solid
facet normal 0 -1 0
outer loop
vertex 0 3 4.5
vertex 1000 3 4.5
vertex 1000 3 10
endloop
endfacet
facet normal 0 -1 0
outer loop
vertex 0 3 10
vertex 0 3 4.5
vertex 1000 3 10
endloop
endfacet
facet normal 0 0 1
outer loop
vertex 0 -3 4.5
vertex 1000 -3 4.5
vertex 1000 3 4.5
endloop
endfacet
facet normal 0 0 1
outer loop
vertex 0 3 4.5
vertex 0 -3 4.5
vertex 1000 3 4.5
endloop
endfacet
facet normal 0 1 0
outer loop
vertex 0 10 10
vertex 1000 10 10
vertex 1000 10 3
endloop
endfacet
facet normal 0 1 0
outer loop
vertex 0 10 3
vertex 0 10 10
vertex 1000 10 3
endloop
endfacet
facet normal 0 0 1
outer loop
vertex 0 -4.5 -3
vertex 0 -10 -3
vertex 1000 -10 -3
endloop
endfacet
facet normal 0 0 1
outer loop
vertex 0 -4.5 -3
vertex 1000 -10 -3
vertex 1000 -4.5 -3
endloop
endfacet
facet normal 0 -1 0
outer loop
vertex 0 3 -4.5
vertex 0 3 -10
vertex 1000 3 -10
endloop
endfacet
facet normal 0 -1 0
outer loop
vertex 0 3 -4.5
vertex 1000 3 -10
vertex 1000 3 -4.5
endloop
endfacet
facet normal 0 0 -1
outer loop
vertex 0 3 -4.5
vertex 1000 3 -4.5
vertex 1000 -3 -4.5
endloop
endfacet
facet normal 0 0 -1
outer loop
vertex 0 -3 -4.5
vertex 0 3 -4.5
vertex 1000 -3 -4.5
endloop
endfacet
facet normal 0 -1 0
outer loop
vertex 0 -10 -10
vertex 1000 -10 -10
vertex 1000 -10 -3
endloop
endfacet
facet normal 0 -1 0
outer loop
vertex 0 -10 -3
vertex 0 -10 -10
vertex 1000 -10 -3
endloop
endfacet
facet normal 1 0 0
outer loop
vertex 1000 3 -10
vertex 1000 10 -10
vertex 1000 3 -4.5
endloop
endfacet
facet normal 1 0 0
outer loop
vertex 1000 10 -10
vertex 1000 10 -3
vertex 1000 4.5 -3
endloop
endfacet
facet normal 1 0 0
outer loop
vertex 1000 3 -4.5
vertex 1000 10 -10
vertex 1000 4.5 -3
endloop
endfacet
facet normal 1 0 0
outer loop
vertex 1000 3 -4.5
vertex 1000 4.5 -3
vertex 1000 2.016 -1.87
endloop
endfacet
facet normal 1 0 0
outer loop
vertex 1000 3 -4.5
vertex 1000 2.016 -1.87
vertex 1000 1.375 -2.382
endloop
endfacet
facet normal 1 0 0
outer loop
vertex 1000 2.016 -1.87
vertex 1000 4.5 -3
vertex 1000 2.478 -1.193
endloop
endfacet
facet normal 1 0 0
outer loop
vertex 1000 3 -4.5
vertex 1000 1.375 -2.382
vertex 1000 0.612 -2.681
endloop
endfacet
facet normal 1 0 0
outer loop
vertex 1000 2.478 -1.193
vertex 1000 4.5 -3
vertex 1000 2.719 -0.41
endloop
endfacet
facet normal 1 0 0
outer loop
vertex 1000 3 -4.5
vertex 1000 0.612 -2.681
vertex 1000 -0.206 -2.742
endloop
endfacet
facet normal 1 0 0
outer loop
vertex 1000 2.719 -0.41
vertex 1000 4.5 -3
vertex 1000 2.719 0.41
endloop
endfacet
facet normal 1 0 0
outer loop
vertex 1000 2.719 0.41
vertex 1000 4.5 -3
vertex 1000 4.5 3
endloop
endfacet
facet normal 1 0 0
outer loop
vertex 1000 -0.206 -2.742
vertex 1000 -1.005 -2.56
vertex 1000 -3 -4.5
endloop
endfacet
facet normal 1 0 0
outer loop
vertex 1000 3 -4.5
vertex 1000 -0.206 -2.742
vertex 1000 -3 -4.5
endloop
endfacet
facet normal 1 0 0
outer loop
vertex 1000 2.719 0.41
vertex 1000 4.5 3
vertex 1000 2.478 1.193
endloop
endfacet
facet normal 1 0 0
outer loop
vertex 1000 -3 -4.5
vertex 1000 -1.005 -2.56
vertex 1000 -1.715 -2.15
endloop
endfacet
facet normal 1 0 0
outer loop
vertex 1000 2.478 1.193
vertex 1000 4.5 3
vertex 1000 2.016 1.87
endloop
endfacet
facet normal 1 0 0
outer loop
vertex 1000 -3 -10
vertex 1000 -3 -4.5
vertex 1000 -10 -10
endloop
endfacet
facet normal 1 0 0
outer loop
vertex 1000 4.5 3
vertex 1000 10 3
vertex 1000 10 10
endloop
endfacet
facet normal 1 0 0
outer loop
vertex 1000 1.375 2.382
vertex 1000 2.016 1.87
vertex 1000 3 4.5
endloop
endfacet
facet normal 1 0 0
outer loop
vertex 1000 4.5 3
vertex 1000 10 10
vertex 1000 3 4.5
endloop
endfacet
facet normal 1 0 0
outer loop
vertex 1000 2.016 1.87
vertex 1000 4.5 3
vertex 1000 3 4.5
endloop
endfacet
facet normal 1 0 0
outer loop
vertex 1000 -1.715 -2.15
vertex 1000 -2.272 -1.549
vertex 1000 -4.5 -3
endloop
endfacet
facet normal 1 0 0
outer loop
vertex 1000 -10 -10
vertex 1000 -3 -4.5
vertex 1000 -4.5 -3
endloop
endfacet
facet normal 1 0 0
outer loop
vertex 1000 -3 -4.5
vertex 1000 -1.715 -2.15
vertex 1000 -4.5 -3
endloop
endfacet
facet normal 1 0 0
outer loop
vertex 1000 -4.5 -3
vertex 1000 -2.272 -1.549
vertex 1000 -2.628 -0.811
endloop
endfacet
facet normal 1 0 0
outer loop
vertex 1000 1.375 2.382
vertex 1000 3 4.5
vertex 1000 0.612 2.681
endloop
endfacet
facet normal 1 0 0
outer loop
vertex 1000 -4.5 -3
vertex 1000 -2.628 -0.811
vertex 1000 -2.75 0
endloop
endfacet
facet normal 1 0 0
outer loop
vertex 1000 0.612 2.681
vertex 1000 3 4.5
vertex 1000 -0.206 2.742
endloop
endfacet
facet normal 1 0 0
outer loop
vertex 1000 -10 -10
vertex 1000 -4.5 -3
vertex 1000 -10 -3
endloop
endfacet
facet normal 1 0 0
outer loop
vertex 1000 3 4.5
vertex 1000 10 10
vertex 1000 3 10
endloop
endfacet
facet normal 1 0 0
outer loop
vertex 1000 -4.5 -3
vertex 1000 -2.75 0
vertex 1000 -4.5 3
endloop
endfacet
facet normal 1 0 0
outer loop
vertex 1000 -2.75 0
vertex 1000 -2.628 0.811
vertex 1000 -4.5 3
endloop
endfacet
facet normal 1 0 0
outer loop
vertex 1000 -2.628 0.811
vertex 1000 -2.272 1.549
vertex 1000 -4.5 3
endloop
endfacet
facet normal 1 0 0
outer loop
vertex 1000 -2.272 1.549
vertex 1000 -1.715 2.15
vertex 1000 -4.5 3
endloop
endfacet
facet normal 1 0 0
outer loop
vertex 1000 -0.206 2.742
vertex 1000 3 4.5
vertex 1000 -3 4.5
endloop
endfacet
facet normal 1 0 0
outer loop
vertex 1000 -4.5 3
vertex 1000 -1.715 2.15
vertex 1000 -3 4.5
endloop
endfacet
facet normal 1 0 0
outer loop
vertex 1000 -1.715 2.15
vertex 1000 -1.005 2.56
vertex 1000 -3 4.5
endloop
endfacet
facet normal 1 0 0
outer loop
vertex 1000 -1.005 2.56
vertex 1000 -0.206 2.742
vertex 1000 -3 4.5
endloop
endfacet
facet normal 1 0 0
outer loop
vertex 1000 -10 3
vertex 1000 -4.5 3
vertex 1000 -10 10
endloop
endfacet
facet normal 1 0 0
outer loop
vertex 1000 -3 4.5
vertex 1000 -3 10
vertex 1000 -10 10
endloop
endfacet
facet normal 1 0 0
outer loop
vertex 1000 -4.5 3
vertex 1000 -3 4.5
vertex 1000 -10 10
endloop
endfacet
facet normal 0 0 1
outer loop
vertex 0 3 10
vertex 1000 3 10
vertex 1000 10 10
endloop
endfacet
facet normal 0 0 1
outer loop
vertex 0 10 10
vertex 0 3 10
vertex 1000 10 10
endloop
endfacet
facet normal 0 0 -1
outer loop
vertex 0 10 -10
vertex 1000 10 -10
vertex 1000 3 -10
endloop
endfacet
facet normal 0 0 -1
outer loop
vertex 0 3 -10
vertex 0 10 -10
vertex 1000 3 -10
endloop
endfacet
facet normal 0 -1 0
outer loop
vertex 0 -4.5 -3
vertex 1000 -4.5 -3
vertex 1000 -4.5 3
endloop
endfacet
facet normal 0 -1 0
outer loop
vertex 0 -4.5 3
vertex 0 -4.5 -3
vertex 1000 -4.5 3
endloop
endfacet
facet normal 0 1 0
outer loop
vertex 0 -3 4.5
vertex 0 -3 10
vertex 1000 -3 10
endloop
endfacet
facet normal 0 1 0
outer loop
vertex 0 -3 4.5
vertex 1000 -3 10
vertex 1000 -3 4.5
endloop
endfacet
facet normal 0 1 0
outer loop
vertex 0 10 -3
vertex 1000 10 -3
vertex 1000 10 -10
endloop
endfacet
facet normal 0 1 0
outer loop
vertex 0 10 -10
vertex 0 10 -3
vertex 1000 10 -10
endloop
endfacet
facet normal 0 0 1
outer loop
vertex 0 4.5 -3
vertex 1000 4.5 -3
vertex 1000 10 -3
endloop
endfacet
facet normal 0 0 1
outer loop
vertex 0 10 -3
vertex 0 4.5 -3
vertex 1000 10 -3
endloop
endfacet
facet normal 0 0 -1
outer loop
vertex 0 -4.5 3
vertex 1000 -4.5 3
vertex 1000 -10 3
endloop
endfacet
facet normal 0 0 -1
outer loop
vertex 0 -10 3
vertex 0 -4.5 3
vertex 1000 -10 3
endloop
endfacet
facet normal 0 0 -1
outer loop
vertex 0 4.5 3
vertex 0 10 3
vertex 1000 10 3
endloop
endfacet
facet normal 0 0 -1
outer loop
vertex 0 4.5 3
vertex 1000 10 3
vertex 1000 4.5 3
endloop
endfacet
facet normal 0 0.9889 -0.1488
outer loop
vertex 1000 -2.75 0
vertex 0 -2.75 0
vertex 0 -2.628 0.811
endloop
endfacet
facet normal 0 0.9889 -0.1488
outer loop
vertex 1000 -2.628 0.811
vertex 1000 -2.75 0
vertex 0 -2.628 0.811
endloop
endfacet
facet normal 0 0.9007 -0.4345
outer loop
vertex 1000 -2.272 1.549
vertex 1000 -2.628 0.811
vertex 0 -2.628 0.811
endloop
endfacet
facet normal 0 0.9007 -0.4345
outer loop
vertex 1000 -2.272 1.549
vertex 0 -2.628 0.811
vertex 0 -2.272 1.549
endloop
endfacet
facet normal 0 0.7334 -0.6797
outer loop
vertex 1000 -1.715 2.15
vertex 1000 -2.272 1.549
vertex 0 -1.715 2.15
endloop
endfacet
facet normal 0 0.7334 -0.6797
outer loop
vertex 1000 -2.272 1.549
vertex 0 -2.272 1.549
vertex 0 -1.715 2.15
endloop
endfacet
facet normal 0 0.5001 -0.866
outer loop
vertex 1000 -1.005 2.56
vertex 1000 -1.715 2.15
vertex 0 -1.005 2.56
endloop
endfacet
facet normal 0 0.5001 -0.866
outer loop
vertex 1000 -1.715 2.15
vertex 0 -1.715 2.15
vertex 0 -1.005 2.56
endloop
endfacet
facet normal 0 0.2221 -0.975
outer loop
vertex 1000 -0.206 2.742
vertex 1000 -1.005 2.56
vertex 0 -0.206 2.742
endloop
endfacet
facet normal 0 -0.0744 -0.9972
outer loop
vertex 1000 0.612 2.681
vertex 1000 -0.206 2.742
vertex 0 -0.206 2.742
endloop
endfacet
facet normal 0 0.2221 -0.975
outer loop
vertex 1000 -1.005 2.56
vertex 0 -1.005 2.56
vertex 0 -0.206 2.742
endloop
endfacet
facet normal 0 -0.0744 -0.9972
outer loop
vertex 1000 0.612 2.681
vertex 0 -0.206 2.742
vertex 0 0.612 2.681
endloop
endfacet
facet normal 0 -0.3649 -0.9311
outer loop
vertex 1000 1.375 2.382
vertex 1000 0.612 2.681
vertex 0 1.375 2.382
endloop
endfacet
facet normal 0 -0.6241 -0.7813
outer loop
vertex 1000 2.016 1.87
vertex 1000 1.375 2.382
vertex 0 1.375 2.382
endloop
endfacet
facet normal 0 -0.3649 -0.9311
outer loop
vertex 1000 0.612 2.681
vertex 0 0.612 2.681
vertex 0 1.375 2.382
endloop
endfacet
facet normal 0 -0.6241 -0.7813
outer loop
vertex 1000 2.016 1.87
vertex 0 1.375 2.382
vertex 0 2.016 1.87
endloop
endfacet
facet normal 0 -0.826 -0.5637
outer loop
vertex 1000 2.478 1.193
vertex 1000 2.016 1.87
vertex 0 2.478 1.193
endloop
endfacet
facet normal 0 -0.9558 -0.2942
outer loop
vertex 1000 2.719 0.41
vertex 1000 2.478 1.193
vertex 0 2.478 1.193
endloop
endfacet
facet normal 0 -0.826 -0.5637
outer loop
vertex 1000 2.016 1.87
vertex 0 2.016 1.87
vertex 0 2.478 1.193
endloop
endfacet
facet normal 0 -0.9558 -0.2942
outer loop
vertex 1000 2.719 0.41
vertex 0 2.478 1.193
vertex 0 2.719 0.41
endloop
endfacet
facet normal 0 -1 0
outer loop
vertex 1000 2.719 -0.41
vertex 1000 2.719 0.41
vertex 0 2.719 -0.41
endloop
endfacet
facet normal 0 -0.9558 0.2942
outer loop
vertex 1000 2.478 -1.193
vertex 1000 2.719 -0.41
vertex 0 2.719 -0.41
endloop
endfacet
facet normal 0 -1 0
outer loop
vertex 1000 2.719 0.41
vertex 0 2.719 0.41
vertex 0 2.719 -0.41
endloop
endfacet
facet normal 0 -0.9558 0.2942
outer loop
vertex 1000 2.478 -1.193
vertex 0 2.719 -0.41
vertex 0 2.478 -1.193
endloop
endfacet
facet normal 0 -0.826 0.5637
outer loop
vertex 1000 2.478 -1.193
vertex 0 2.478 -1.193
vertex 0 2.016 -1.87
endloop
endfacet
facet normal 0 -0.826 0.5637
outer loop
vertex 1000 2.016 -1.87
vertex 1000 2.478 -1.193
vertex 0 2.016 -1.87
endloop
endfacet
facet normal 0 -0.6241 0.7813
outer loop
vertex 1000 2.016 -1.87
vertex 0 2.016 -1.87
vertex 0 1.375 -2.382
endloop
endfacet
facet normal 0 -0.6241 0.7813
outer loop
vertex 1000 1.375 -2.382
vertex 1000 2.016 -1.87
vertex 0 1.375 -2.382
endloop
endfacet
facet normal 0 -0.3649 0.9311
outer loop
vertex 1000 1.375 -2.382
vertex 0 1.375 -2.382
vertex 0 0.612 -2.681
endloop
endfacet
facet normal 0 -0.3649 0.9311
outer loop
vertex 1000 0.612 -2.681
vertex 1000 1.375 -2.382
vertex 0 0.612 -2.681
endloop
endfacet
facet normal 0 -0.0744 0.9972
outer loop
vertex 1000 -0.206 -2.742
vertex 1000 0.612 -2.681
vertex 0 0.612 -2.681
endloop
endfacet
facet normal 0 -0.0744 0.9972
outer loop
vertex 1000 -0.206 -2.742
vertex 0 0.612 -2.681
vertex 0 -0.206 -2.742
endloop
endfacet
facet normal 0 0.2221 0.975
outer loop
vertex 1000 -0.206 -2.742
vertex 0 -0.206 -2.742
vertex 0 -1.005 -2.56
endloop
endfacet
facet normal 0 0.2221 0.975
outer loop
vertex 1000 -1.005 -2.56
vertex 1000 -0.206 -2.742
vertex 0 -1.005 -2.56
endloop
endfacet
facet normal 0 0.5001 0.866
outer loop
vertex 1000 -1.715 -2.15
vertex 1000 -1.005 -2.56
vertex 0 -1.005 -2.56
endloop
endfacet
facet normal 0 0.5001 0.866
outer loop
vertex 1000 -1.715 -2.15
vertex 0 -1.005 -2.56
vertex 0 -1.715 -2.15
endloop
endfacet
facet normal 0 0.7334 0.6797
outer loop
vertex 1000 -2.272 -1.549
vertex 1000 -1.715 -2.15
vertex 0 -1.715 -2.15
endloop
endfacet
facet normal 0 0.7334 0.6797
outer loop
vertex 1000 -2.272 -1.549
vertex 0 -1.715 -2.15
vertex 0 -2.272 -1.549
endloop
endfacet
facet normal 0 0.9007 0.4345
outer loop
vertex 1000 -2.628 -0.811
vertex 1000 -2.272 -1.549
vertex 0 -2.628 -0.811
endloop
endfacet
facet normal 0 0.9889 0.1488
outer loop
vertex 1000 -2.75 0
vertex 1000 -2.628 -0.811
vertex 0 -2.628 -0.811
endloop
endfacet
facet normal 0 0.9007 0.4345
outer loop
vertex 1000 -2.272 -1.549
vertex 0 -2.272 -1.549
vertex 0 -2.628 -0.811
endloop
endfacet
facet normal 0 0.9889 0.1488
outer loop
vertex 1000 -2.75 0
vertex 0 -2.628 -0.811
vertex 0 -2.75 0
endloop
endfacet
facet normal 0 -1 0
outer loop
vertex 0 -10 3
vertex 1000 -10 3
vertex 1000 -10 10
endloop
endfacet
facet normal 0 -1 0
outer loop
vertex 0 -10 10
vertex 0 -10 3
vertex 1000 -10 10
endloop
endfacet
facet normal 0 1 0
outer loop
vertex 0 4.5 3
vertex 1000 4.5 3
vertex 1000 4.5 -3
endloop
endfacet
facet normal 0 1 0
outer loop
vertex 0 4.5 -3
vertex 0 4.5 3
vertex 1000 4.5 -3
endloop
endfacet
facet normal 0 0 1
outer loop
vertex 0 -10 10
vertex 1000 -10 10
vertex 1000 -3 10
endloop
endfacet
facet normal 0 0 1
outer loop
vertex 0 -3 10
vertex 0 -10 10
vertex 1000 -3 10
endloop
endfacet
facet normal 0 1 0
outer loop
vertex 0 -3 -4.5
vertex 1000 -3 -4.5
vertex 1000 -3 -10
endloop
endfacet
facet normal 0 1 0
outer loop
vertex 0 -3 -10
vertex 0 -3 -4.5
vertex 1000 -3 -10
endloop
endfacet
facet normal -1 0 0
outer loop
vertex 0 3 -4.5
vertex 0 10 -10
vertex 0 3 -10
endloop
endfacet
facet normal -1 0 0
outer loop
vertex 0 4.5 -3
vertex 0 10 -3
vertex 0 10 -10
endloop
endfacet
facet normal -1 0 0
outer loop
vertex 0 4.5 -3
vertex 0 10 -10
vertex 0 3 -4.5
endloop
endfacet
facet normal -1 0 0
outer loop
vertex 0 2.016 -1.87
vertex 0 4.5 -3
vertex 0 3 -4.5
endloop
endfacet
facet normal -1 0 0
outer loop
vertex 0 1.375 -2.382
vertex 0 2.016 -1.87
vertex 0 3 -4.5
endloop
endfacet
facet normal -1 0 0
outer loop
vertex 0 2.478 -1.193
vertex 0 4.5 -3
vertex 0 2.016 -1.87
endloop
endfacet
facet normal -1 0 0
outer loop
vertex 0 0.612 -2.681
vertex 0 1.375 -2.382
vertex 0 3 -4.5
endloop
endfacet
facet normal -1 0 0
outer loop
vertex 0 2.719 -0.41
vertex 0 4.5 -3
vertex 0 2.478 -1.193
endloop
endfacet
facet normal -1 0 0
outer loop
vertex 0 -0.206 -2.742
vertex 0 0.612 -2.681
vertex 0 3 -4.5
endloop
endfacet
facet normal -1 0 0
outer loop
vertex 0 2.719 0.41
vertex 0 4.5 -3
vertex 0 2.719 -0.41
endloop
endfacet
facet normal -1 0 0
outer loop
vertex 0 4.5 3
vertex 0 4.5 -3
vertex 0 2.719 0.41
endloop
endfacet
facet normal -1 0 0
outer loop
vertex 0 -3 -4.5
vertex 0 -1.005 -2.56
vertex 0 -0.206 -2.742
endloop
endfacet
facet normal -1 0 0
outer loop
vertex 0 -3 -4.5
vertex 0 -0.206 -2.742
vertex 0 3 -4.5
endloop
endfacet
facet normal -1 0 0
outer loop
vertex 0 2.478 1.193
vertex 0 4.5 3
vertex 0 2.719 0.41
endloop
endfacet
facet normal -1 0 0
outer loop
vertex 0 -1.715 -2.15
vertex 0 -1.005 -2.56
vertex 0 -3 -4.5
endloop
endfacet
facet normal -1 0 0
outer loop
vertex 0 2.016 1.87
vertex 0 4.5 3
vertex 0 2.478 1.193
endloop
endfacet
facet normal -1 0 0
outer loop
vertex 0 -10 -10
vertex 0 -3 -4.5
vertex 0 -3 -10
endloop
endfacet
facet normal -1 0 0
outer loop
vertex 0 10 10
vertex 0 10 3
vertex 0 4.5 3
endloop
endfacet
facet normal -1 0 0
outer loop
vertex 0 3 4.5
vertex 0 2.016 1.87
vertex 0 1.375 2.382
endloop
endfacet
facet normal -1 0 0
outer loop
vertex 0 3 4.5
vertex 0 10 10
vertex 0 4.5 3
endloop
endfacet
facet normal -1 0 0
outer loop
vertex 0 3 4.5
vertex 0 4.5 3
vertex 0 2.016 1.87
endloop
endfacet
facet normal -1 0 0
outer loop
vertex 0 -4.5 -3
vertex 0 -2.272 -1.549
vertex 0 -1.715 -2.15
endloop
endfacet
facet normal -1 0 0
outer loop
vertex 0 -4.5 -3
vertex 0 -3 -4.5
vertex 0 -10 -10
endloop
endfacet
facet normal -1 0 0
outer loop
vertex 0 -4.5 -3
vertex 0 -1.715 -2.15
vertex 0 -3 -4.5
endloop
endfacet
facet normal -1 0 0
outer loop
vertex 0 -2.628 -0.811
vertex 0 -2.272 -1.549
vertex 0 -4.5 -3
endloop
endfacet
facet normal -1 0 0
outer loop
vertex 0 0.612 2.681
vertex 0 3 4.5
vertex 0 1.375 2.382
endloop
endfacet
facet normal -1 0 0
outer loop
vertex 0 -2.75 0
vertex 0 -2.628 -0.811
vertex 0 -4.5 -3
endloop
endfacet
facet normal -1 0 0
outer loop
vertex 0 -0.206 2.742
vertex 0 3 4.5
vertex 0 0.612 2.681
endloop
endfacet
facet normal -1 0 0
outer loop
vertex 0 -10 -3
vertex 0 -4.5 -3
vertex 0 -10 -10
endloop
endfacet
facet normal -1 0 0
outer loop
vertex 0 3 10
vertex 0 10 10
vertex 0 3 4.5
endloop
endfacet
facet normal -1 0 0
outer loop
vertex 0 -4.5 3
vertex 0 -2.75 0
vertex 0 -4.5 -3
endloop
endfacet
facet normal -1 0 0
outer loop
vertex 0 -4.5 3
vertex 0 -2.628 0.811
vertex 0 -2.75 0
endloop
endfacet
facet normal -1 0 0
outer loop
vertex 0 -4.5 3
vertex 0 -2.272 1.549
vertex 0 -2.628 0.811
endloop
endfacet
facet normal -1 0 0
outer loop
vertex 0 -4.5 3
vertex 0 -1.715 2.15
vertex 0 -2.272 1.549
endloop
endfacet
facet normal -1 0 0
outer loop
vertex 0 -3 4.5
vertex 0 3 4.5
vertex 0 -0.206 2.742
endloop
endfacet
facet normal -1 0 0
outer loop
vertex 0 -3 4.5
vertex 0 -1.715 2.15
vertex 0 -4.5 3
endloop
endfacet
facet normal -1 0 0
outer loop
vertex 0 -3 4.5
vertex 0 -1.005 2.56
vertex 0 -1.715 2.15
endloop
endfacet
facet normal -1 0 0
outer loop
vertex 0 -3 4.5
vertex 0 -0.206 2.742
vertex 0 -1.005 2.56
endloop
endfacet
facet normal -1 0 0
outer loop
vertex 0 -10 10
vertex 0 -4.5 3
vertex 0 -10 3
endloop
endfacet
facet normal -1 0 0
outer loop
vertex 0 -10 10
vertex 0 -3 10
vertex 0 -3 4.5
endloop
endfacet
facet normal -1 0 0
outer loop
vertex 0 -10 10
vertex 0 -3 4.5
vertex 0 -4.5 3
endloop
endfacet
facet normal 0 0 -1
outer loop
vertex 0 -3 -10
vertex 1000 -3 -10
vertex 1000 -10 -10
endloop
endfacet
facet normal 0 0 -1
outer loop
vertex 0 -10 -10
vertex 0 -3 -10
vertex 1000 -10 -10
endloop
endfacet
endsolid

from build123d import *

# Parameters (mm, degrees)
ESQUISSE1_R        = 2.75
BOSS_EXTRU_1_DEPTH = 1000


with BuildPart() as part:
    # Esquisse1 → Boss.-Extru.1 (new body)
    with BuildSketch(Plane(origin=(0, 0, 0), x_dir=(0, -1, 0), z_dir=(-1, 0, 0))):
        Polygon((-3, -10), (-3, -4.5), (3, -4.5), (3, -10), (10, -10), (10, -3), (4.5, -3), (4.5, 3), (10, 3), (10, 10), (3, 10), (3, 4.5), (-3, 4.5), (-3, 10), (-10, 10), (-10, 3), (-4.5, 3), (-4.5, -3), (-10, -3), (-10, -10), align=None)
        Circle(ESQUISSE1_R, mode=Mode.SUBTRACT)
    extrude(amount=-BOSS_EXTRU_1_DEPTH)


solid = part.part
